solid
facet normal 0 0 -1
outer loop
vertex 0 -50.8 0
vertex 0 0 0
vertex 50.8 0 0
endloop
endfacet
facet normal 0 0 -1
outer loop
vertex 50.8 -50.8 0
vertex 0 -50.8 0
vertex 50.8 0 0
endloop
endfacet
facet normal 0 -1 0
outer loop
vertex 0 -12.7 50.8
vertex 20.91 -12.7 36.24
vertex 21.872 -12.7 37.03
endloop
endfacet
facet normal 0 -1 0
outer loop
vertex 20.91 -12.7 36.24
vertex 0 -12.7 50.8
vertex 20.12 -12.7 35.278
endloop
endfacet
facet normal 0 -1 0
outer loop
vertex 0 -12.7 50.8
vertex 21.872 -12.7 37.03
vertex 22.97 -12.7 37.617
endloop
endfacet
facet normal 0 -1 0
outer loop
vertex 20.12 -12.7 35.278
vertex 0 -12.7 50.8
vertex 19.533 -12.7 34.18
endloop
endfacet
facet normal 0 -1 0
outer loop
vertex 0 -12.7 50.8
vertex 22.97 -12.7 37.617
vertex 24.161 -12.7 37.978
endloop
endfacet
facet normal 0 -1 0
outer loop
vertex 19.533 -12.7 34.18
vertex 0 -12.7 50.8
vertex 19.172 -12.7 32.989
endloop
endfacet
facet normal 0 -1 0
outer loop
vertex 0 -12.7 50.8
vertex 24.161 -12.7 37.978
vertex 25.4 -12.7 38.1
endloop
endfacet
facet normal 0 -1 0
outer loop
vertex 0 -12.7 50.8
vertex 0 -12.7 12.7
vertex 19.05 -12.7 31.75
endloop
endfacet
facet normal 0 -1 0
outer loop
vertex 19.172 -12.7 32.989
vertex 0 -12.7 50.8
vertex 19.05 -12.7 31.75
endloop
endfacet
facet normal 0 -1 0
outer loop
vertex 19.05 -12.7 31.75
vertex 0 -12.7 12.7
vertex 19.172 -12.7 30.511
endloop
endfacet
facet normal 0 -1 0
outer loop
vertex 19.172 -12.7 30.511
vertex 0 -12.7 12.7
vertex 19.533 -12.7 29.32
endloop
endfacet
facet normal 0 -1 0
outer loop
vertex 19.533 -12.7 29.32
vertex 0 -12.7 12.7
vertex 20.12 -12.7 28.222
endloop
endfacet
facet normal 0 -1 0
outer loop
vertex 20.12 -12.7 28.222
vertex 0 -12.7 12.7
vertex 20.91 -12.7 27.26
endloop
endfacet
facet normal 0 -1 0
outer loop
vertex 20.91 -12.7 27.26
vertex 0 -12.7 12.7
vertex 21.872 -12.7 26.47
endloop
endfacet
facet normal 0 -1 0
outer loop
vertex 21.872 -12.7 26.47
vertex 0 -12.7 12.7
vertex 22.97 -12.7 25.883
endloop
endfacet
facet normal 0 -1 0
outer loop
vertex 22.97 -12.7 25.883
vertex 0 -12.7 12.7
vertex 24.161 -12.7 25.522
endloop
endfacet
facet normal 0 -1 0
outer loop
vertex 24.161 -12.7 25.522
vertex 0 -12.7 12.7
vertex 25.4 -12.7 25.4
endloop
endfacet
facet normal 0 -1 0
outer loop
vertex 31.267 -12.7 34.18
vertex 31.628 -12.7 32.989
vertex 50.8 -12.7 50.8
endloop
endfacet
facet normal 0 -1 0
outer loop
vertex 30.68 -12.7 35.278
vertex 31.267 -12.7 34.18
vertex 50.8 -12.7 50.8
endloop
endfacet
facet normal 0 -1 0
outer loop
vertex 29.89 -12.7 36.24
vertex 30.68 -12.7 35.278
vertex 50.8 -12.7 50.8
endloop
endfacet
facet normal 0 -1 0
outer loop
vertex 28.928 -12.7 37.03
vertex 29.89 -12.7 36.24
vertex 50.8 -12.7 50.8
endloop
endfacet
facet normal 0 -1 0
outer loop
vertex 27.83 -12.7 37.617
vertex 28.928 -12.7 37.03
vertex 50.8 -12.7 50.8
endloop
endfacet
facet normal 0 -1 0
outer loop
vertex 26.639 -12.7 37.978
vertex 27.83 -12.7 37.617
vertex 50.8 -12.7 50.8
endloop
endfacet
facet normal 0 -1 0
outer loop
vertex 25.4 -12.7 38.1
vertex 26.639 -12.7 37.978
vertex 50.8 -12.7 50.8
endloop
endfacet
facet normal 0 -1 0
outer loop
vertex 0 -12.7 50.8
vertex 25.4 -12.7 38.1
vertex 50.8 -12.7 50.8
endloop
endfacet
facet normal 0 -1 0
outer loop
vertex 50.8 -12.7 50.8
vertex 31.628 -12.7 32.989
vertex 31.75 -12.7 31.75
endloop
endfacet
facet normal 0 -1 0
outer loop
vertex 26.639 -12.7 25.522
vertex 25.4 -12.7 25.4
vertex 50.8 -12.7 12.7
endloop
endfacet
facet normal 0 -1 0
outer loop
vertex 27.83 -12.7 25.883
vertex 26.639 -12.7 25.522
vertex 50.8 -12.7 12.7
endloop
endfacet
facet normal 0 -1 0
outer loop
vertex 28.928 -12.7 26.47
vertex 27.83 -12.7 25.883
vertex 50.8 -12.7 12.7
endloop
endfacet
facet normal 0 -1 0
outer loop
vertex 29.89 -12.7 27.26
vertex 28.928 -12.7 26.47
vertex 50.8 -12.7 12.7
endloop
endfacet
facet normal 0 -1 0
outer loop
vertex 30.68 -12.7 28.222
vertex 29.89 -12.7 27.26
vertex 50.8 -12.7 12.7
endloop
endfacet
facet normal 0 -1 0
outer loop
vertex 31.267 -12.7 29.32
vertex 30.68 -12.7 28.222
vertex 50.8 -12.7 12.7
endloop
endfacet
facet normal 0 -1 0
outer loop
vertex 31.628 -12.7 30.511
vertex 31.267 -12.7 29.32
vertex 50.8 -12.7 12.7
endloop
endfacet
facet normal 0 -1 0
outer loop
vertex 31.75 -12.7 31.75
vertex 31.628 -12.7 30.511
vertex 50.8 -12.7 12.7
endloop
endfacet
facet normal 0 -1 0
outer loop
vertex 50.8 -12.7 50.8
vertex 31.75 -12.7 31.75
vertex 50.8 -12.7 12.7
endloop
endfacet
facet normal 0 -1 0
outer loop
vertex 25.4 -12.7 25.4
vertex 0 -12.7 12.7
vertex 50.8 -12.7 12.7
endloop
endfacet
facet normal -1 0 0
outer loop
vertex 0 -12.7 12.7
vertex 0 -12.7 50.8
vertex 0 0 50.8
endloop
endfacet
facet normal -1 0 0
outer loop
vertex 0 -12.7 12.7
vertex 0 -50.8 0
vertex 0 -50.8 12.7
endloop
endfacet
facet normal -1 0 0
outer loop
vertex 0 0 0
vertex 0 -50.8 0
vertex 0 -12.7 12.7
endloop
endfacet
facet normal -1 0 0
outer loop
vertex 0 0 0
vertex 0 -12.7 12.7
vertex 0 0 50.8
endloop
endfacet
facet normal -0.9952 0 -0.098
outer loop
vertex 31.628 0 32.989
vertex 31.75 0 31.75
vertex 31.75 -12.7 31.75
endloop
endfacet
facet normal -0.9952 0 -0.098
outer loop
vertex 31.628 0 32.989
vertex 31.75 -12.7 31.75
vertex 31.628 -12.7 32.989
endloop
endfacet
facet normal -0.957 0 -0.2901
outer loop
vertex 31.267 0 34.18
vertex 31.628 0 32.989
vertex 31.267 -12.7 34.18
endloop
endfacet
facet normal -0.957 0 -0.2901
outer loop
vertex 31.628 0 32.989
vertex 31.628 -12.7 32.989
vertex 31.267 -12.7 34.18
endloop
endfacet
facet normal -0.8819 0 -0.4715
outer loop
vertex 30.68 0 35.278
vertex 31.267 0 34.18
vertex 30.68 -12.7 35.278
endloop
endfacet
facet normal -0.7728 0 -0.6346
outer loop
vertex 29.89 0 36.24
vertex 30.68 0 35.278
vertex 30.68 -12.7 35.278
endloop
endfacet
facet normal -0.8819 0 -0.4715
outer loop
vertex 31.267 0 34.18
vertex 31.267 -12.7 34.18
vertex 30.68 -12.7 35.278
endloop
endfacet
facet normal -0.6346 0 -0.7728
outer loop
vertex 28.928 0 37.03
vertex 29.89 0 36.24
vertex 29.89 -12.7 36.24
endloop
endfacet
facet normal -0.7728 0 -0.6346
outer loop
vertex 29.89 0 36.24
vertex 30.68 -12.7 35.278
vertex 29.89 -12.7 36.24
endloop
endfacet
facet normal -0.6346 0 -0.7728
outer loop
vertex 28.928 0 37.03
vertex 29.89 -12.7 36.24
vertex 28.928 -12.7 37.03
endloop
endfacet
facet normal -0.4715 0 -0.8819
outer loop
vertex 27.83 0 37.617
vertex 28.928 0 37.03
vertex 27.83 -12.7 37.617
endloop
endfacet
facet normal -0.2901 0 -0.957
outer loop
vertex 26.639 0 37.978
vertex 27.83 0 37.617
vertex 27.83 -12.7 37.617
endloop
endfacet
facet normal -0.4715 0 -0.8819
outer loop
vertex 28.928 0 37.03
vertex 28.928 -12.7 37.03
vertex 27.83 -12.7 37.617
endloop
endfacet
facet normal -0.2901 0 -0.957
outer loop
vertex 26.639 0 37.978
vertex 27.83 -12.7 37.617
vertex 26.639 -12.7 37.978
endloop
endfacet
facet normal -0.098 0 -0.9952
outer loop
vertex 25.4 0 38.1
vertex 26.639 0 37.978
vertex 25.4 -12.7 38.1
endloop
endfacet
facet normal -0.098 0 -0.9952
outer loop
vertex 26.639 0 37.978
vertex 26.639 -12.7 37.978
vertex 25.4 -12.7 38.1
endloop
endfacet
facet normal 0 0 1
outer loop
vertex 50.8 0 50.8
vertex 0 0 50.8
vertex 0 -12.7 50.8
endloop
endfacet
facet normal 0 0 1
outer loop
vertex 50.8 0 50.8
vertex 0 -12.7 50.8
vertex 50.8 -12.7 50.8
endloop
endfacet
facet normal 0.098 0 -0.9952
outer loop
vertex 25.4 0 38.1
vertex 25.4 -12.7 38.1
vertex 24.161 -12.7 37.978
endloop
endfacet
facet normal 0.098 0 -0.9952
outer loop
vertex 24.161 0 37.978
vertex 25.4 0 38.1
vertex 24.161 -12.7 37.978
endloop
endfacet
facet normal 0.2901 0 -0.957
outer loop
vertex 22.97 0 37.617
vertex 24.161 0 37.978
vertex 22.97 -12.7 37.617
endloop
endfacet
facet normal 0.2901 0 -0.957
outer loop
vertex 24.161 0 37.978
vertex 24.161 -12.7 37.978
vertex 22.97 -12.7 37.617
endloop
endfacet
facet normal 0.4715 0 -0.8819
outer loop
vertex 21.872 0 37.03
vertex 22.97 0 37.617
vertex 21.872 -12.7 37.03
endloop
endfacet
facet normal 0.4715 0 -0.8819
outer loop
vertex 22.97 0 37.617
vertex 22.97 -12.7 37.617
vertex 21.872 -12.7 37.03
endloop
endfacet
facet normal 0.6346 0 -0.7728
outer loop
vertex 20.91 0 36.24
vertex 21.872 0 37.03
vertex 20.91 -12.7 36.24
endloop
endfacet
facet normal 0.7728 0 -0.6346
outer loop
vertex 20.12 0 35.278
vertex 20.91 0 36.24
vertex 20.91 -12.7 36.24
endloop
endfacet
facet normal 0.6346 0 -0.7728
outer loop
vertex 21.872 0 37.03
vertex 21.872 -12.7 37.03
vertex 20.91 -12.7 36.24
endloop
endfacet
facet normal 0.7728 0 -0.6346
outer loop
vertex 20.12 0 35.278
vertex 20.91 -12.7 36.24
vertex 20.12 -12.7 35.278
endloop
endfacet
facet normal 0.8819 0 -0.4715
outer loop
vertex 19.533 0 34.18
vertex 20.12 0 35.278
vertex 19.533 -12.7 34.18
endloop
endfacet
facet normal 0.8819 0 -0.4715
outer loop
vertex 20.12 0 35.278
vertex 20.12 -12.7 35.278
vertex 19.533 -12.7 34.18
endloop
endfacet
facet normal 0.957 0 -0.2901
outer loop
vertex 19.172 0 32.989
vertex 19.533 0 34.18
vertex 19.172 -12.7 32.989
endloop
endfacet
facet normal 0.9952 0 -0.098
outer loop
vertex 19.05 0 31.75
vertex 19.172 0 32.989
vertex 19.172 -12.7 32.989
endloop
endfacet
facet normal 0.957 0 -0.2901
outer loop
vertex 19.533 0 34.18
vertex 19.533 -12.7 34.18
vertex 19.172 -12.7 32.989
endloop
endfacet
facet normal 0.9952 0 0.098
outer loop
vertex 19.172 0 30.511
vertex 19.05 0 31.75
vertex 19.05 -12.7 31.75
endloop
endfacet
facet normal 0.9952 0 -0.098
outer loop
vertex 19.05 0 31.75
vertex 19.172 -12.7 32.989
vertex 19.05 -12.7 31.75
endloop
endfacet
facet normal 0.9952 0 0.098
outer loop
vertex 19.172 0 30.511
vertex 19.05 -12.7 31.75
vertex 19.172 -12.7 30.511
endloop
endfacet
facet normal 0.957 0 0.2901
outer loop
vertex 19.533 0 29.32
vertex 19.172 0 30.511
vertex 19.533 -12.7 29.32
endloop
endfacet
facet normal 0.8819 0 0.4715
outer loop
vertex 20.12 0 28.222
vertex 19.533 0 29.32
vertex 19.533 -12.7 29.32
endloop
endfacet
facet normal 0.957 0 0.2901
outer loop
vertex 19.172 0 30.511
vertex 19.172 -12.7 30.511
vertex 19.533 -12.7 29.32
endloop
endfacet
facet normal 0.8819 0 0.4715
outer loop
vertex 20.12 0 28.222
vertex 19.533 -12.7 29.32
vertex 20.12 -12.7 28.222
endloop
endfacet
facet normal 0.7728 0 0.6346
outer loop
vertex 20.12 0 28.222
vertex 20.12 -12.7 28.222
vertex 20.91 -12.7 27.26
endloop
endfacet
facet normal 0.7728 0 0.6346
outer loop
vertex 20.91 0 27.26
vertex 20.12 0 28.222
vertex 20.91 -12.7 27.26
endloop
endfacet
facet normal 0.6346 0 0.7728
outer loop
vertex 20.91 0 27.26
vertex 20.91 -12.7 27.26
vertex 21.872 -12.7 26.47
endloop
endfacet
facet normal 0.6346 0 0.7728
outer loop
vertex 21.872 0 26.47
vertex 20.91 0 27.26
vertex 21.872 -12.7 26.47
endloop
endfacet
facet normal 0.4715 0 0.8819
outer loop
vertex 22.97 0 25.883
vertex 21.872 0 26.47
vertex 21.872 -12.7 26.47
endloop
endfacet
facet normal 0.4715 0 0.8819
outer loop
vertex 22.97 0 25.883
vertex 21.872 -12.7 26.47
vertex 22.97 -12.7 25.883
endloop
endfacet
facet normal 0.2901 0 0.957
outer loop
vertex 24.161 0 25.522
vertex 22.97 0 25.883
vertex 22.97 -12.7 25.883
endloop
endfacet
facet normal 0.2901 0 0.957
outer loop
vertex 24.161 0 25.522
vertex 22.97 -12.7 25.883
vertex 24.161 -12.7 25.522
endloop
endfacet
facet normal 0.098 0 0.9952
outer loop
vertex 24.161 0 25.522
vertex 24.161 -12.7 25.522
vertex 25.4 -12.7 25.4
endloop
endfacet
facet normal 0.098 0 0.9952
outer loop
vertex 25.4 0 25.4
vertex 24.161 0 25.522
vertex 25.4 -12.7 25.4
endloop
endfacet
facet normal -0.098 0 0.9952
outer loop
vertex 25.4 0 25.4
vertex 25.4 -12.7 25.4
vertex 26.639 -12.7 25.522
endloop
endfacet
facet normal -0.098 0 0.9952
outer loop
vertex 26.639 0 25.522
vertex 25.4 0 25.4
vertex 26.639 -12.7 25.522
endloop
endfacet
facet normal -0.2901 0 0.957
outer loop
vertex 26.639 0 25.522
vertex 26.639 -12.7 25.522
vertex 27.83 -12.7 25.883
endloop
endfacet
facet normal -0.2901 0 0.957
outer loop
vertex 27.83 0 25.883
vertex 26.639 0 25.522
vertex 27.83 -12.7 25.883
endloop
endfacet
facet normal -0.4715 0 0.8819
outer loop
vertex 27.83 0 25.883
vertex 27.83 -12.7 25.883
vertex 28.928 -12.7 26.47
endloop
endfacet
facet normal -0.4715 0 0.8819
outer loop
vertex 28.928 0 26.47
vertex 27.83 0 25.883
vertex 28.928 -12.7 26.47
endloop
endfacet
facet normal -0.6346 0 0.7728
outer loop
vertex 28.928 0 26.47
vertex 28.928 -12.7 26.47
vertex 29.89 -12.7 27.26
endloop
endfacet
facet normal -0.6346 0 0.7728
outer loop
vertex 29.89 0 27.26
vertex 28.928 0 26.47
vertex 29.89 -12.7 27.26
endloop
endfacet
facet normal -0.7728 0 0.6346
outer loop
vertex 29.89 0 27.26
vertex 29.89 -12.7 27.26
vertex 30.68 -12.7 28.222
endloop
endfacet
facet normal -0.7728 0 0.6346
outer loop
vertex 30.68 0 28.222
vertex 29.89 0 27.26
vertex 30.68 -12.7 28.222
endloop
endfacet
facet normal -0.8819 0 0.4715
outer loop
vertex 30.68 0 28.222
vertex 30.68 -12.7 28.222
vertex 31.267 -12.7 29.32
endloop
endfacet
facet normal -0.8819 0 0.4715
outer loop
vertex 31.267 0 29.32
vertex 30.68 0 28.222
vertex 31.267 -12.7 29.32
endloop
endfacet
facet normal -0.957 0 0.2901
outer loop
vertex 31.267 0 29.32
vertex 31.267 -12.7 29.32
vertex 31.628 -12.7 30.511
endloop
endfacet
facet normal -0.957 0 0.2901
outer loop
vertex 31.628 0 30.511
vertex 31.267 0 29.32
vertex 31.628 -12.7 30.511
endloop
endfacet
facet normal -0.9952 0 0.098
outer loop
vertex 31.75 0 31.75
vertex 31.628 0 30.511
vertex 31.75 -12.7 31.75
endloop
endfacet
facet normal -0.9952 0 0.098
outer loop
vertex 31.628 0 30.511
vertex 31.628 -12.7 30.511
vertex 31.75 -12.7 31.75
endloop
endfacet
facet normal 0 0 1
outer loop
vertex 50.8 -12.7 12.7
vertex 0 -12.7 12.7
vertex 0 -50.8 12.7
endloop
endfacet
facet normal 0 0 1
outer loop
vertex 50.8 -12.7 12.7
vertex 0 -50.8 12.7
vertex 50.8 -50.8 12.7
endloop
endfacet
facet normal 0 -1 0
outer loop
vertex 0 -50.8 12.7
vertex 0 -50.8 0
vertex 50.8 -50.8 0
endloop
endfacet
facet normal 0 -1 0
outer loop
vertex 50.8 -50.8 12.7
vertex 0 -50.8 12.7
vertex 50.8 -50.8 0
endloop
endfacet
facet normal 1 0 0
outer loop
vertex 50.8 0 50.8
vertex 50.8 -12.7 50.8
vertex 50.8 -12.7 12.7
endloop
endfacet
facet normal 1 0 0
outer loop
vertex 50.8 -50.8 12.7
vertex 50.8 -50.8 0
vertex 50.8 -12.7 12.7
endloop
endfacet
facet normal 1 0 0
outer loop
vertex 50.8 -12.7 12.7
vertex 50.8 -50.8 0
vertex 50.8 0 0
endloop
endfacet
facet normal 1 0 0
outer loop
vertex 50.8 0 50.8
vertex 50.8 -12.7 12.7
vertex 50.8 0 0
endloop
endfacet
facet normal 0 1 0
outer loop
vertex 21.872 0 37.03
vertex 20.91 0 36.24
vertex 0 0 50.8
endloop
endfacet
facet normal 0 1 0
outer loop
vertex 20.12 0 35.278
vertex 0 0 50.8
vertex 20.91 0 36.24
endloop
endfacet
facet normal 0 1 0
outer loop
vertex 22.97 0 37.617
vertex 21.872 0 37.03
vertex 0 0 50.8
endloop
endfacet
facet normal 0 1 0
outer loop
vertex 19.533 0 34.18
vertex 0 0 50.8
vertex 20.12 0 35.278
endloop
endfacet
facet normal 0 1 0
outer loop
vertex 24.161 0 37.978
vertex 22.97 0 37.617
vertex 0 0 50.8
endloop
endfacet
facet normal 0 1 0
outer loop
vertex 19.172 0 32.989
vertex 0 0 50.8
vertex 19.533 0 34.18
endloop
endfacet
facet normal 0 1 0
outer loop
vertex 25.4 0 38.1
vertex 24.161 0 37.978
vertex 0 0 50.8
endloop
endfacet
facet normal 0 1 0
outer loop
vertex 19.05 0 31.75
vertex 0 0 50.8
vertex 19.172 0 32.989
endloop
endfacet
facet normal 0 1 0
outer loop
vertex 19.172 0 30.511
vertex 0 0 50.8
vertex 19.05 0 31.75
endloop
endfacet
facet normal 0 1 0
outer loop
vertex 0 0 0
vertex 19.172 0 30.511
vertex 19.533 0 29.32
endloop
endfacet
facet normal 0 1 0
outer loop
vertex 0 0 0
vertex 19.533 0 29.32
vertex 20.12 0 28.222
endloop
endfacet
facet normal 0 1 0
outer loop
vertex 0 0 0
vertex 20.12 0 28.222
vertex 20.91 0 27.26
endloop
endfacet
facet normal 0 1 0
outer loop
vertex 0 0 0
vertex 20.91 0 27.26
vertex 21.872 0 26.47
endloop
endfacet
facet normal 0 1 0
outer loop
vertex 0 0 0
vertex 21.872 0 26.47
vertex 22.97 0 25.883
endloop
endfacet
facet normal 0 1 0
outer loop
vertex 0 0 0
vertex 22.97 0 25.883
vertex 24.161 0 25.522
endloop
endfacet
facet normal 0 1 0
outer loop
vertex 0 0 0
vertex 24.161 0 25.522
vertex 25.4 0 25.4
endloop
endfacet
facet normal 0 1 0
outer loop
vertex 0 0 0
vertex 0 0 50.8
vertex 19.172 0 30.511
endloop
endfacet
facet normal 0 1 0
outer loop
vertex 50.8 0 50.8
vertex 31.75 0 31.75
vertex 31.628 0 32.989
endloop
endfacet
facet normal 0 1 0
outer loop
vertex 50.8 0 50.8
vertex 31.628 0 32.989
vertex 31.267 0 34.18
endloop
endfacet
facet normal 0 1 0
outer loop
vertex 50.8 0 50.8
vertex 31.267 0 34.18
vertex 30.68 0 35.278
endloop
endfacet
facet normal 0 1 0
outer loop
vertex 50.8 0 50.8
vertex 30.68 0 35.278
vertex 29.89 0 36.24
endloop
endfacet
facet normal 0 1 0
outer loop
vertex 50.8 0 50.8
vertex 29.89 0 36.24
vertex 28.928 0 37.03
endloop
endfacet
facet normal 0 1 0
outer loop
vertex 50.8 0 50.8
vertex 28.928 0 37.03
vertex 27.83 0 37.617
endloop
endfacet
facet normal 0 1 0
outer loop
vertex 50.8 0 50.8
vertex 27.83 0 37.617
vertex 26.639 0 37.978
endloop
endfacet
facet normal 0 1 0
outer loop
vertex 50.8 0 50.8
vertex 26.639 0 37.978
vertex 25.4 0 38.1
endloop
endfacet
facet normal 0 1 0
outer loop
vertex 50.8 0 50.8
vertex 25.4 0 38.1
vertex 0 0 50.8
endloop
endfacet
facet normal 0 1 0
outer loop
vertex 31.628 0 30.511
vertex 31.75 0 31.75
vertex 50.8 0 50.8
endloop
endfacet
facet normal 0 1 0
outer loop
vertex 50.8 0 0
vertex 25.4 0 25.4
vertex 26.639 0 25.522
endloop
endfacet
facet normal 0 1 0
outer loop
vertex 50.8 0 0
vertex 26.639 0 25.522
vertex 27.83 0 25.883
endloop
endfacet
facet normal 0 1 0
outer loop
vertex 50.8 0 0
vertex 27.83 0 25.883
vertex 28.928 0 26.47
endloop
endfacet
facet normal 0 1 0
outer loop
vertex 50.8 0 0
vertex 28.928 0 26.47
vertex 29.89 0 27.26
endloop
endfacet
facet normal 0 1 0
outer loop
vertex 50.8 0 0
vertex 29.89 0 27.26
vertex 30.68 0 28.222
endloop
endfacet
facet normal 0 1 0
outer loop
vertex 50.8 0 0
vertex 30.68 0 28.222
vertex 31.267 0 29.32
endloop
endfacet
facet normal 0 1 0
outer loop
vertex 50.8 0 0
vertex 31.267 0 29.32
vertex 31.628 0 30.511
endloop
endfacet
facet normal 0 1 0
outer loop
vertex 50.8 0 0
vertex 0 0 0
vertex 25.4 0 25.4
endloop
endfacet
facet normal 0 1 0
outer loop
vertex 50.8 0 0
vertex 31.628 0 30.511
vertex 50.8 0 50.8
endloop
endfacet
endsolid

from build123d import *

# Parameters (mm, degrees)
F0_W     = 50.8
F0_H     = 50.8
F1_DEPTH = 12.7
F2_W     = 50.8
F2_H     = 12.7
F3_DEPTH = 38.1
F5_DEPTH = 55.88


with BuildPart() as f1:
    # F0 (on Top) → F1 (new body)
    with BuildSketch(Plane.XY):
        with Locations((25.4, -25.4)):
            Rectangle(F0_W, F0_H)
    extrude(amount=F1_DEPTH)

    # F2 (on face) → F3 (join)
    with BuildSketch(Plane.XY.offset(12.7)):
        with Locations((25.4, -6.35)):
            Rectangle(F2_W, F2_H)
    extrude(amount=F3_DEPTH)

    # F4 (on face) → F5 (cut)
    with BuildSketch(Plane.XZ.offset(12.7)):
        with BuildLine():
            ThreePointArc((25.4, 38.1), (20.909872, 27.259872), (31.75, 31.75))
            ThreePointArc((31.75, 31.75), (29.890128, 36.240128), (25.4, 38.1))
        make_face()
    extrude(amount=-F5_DEPTH, mode=Mode.SUBTRACT)


solid = f1.part
